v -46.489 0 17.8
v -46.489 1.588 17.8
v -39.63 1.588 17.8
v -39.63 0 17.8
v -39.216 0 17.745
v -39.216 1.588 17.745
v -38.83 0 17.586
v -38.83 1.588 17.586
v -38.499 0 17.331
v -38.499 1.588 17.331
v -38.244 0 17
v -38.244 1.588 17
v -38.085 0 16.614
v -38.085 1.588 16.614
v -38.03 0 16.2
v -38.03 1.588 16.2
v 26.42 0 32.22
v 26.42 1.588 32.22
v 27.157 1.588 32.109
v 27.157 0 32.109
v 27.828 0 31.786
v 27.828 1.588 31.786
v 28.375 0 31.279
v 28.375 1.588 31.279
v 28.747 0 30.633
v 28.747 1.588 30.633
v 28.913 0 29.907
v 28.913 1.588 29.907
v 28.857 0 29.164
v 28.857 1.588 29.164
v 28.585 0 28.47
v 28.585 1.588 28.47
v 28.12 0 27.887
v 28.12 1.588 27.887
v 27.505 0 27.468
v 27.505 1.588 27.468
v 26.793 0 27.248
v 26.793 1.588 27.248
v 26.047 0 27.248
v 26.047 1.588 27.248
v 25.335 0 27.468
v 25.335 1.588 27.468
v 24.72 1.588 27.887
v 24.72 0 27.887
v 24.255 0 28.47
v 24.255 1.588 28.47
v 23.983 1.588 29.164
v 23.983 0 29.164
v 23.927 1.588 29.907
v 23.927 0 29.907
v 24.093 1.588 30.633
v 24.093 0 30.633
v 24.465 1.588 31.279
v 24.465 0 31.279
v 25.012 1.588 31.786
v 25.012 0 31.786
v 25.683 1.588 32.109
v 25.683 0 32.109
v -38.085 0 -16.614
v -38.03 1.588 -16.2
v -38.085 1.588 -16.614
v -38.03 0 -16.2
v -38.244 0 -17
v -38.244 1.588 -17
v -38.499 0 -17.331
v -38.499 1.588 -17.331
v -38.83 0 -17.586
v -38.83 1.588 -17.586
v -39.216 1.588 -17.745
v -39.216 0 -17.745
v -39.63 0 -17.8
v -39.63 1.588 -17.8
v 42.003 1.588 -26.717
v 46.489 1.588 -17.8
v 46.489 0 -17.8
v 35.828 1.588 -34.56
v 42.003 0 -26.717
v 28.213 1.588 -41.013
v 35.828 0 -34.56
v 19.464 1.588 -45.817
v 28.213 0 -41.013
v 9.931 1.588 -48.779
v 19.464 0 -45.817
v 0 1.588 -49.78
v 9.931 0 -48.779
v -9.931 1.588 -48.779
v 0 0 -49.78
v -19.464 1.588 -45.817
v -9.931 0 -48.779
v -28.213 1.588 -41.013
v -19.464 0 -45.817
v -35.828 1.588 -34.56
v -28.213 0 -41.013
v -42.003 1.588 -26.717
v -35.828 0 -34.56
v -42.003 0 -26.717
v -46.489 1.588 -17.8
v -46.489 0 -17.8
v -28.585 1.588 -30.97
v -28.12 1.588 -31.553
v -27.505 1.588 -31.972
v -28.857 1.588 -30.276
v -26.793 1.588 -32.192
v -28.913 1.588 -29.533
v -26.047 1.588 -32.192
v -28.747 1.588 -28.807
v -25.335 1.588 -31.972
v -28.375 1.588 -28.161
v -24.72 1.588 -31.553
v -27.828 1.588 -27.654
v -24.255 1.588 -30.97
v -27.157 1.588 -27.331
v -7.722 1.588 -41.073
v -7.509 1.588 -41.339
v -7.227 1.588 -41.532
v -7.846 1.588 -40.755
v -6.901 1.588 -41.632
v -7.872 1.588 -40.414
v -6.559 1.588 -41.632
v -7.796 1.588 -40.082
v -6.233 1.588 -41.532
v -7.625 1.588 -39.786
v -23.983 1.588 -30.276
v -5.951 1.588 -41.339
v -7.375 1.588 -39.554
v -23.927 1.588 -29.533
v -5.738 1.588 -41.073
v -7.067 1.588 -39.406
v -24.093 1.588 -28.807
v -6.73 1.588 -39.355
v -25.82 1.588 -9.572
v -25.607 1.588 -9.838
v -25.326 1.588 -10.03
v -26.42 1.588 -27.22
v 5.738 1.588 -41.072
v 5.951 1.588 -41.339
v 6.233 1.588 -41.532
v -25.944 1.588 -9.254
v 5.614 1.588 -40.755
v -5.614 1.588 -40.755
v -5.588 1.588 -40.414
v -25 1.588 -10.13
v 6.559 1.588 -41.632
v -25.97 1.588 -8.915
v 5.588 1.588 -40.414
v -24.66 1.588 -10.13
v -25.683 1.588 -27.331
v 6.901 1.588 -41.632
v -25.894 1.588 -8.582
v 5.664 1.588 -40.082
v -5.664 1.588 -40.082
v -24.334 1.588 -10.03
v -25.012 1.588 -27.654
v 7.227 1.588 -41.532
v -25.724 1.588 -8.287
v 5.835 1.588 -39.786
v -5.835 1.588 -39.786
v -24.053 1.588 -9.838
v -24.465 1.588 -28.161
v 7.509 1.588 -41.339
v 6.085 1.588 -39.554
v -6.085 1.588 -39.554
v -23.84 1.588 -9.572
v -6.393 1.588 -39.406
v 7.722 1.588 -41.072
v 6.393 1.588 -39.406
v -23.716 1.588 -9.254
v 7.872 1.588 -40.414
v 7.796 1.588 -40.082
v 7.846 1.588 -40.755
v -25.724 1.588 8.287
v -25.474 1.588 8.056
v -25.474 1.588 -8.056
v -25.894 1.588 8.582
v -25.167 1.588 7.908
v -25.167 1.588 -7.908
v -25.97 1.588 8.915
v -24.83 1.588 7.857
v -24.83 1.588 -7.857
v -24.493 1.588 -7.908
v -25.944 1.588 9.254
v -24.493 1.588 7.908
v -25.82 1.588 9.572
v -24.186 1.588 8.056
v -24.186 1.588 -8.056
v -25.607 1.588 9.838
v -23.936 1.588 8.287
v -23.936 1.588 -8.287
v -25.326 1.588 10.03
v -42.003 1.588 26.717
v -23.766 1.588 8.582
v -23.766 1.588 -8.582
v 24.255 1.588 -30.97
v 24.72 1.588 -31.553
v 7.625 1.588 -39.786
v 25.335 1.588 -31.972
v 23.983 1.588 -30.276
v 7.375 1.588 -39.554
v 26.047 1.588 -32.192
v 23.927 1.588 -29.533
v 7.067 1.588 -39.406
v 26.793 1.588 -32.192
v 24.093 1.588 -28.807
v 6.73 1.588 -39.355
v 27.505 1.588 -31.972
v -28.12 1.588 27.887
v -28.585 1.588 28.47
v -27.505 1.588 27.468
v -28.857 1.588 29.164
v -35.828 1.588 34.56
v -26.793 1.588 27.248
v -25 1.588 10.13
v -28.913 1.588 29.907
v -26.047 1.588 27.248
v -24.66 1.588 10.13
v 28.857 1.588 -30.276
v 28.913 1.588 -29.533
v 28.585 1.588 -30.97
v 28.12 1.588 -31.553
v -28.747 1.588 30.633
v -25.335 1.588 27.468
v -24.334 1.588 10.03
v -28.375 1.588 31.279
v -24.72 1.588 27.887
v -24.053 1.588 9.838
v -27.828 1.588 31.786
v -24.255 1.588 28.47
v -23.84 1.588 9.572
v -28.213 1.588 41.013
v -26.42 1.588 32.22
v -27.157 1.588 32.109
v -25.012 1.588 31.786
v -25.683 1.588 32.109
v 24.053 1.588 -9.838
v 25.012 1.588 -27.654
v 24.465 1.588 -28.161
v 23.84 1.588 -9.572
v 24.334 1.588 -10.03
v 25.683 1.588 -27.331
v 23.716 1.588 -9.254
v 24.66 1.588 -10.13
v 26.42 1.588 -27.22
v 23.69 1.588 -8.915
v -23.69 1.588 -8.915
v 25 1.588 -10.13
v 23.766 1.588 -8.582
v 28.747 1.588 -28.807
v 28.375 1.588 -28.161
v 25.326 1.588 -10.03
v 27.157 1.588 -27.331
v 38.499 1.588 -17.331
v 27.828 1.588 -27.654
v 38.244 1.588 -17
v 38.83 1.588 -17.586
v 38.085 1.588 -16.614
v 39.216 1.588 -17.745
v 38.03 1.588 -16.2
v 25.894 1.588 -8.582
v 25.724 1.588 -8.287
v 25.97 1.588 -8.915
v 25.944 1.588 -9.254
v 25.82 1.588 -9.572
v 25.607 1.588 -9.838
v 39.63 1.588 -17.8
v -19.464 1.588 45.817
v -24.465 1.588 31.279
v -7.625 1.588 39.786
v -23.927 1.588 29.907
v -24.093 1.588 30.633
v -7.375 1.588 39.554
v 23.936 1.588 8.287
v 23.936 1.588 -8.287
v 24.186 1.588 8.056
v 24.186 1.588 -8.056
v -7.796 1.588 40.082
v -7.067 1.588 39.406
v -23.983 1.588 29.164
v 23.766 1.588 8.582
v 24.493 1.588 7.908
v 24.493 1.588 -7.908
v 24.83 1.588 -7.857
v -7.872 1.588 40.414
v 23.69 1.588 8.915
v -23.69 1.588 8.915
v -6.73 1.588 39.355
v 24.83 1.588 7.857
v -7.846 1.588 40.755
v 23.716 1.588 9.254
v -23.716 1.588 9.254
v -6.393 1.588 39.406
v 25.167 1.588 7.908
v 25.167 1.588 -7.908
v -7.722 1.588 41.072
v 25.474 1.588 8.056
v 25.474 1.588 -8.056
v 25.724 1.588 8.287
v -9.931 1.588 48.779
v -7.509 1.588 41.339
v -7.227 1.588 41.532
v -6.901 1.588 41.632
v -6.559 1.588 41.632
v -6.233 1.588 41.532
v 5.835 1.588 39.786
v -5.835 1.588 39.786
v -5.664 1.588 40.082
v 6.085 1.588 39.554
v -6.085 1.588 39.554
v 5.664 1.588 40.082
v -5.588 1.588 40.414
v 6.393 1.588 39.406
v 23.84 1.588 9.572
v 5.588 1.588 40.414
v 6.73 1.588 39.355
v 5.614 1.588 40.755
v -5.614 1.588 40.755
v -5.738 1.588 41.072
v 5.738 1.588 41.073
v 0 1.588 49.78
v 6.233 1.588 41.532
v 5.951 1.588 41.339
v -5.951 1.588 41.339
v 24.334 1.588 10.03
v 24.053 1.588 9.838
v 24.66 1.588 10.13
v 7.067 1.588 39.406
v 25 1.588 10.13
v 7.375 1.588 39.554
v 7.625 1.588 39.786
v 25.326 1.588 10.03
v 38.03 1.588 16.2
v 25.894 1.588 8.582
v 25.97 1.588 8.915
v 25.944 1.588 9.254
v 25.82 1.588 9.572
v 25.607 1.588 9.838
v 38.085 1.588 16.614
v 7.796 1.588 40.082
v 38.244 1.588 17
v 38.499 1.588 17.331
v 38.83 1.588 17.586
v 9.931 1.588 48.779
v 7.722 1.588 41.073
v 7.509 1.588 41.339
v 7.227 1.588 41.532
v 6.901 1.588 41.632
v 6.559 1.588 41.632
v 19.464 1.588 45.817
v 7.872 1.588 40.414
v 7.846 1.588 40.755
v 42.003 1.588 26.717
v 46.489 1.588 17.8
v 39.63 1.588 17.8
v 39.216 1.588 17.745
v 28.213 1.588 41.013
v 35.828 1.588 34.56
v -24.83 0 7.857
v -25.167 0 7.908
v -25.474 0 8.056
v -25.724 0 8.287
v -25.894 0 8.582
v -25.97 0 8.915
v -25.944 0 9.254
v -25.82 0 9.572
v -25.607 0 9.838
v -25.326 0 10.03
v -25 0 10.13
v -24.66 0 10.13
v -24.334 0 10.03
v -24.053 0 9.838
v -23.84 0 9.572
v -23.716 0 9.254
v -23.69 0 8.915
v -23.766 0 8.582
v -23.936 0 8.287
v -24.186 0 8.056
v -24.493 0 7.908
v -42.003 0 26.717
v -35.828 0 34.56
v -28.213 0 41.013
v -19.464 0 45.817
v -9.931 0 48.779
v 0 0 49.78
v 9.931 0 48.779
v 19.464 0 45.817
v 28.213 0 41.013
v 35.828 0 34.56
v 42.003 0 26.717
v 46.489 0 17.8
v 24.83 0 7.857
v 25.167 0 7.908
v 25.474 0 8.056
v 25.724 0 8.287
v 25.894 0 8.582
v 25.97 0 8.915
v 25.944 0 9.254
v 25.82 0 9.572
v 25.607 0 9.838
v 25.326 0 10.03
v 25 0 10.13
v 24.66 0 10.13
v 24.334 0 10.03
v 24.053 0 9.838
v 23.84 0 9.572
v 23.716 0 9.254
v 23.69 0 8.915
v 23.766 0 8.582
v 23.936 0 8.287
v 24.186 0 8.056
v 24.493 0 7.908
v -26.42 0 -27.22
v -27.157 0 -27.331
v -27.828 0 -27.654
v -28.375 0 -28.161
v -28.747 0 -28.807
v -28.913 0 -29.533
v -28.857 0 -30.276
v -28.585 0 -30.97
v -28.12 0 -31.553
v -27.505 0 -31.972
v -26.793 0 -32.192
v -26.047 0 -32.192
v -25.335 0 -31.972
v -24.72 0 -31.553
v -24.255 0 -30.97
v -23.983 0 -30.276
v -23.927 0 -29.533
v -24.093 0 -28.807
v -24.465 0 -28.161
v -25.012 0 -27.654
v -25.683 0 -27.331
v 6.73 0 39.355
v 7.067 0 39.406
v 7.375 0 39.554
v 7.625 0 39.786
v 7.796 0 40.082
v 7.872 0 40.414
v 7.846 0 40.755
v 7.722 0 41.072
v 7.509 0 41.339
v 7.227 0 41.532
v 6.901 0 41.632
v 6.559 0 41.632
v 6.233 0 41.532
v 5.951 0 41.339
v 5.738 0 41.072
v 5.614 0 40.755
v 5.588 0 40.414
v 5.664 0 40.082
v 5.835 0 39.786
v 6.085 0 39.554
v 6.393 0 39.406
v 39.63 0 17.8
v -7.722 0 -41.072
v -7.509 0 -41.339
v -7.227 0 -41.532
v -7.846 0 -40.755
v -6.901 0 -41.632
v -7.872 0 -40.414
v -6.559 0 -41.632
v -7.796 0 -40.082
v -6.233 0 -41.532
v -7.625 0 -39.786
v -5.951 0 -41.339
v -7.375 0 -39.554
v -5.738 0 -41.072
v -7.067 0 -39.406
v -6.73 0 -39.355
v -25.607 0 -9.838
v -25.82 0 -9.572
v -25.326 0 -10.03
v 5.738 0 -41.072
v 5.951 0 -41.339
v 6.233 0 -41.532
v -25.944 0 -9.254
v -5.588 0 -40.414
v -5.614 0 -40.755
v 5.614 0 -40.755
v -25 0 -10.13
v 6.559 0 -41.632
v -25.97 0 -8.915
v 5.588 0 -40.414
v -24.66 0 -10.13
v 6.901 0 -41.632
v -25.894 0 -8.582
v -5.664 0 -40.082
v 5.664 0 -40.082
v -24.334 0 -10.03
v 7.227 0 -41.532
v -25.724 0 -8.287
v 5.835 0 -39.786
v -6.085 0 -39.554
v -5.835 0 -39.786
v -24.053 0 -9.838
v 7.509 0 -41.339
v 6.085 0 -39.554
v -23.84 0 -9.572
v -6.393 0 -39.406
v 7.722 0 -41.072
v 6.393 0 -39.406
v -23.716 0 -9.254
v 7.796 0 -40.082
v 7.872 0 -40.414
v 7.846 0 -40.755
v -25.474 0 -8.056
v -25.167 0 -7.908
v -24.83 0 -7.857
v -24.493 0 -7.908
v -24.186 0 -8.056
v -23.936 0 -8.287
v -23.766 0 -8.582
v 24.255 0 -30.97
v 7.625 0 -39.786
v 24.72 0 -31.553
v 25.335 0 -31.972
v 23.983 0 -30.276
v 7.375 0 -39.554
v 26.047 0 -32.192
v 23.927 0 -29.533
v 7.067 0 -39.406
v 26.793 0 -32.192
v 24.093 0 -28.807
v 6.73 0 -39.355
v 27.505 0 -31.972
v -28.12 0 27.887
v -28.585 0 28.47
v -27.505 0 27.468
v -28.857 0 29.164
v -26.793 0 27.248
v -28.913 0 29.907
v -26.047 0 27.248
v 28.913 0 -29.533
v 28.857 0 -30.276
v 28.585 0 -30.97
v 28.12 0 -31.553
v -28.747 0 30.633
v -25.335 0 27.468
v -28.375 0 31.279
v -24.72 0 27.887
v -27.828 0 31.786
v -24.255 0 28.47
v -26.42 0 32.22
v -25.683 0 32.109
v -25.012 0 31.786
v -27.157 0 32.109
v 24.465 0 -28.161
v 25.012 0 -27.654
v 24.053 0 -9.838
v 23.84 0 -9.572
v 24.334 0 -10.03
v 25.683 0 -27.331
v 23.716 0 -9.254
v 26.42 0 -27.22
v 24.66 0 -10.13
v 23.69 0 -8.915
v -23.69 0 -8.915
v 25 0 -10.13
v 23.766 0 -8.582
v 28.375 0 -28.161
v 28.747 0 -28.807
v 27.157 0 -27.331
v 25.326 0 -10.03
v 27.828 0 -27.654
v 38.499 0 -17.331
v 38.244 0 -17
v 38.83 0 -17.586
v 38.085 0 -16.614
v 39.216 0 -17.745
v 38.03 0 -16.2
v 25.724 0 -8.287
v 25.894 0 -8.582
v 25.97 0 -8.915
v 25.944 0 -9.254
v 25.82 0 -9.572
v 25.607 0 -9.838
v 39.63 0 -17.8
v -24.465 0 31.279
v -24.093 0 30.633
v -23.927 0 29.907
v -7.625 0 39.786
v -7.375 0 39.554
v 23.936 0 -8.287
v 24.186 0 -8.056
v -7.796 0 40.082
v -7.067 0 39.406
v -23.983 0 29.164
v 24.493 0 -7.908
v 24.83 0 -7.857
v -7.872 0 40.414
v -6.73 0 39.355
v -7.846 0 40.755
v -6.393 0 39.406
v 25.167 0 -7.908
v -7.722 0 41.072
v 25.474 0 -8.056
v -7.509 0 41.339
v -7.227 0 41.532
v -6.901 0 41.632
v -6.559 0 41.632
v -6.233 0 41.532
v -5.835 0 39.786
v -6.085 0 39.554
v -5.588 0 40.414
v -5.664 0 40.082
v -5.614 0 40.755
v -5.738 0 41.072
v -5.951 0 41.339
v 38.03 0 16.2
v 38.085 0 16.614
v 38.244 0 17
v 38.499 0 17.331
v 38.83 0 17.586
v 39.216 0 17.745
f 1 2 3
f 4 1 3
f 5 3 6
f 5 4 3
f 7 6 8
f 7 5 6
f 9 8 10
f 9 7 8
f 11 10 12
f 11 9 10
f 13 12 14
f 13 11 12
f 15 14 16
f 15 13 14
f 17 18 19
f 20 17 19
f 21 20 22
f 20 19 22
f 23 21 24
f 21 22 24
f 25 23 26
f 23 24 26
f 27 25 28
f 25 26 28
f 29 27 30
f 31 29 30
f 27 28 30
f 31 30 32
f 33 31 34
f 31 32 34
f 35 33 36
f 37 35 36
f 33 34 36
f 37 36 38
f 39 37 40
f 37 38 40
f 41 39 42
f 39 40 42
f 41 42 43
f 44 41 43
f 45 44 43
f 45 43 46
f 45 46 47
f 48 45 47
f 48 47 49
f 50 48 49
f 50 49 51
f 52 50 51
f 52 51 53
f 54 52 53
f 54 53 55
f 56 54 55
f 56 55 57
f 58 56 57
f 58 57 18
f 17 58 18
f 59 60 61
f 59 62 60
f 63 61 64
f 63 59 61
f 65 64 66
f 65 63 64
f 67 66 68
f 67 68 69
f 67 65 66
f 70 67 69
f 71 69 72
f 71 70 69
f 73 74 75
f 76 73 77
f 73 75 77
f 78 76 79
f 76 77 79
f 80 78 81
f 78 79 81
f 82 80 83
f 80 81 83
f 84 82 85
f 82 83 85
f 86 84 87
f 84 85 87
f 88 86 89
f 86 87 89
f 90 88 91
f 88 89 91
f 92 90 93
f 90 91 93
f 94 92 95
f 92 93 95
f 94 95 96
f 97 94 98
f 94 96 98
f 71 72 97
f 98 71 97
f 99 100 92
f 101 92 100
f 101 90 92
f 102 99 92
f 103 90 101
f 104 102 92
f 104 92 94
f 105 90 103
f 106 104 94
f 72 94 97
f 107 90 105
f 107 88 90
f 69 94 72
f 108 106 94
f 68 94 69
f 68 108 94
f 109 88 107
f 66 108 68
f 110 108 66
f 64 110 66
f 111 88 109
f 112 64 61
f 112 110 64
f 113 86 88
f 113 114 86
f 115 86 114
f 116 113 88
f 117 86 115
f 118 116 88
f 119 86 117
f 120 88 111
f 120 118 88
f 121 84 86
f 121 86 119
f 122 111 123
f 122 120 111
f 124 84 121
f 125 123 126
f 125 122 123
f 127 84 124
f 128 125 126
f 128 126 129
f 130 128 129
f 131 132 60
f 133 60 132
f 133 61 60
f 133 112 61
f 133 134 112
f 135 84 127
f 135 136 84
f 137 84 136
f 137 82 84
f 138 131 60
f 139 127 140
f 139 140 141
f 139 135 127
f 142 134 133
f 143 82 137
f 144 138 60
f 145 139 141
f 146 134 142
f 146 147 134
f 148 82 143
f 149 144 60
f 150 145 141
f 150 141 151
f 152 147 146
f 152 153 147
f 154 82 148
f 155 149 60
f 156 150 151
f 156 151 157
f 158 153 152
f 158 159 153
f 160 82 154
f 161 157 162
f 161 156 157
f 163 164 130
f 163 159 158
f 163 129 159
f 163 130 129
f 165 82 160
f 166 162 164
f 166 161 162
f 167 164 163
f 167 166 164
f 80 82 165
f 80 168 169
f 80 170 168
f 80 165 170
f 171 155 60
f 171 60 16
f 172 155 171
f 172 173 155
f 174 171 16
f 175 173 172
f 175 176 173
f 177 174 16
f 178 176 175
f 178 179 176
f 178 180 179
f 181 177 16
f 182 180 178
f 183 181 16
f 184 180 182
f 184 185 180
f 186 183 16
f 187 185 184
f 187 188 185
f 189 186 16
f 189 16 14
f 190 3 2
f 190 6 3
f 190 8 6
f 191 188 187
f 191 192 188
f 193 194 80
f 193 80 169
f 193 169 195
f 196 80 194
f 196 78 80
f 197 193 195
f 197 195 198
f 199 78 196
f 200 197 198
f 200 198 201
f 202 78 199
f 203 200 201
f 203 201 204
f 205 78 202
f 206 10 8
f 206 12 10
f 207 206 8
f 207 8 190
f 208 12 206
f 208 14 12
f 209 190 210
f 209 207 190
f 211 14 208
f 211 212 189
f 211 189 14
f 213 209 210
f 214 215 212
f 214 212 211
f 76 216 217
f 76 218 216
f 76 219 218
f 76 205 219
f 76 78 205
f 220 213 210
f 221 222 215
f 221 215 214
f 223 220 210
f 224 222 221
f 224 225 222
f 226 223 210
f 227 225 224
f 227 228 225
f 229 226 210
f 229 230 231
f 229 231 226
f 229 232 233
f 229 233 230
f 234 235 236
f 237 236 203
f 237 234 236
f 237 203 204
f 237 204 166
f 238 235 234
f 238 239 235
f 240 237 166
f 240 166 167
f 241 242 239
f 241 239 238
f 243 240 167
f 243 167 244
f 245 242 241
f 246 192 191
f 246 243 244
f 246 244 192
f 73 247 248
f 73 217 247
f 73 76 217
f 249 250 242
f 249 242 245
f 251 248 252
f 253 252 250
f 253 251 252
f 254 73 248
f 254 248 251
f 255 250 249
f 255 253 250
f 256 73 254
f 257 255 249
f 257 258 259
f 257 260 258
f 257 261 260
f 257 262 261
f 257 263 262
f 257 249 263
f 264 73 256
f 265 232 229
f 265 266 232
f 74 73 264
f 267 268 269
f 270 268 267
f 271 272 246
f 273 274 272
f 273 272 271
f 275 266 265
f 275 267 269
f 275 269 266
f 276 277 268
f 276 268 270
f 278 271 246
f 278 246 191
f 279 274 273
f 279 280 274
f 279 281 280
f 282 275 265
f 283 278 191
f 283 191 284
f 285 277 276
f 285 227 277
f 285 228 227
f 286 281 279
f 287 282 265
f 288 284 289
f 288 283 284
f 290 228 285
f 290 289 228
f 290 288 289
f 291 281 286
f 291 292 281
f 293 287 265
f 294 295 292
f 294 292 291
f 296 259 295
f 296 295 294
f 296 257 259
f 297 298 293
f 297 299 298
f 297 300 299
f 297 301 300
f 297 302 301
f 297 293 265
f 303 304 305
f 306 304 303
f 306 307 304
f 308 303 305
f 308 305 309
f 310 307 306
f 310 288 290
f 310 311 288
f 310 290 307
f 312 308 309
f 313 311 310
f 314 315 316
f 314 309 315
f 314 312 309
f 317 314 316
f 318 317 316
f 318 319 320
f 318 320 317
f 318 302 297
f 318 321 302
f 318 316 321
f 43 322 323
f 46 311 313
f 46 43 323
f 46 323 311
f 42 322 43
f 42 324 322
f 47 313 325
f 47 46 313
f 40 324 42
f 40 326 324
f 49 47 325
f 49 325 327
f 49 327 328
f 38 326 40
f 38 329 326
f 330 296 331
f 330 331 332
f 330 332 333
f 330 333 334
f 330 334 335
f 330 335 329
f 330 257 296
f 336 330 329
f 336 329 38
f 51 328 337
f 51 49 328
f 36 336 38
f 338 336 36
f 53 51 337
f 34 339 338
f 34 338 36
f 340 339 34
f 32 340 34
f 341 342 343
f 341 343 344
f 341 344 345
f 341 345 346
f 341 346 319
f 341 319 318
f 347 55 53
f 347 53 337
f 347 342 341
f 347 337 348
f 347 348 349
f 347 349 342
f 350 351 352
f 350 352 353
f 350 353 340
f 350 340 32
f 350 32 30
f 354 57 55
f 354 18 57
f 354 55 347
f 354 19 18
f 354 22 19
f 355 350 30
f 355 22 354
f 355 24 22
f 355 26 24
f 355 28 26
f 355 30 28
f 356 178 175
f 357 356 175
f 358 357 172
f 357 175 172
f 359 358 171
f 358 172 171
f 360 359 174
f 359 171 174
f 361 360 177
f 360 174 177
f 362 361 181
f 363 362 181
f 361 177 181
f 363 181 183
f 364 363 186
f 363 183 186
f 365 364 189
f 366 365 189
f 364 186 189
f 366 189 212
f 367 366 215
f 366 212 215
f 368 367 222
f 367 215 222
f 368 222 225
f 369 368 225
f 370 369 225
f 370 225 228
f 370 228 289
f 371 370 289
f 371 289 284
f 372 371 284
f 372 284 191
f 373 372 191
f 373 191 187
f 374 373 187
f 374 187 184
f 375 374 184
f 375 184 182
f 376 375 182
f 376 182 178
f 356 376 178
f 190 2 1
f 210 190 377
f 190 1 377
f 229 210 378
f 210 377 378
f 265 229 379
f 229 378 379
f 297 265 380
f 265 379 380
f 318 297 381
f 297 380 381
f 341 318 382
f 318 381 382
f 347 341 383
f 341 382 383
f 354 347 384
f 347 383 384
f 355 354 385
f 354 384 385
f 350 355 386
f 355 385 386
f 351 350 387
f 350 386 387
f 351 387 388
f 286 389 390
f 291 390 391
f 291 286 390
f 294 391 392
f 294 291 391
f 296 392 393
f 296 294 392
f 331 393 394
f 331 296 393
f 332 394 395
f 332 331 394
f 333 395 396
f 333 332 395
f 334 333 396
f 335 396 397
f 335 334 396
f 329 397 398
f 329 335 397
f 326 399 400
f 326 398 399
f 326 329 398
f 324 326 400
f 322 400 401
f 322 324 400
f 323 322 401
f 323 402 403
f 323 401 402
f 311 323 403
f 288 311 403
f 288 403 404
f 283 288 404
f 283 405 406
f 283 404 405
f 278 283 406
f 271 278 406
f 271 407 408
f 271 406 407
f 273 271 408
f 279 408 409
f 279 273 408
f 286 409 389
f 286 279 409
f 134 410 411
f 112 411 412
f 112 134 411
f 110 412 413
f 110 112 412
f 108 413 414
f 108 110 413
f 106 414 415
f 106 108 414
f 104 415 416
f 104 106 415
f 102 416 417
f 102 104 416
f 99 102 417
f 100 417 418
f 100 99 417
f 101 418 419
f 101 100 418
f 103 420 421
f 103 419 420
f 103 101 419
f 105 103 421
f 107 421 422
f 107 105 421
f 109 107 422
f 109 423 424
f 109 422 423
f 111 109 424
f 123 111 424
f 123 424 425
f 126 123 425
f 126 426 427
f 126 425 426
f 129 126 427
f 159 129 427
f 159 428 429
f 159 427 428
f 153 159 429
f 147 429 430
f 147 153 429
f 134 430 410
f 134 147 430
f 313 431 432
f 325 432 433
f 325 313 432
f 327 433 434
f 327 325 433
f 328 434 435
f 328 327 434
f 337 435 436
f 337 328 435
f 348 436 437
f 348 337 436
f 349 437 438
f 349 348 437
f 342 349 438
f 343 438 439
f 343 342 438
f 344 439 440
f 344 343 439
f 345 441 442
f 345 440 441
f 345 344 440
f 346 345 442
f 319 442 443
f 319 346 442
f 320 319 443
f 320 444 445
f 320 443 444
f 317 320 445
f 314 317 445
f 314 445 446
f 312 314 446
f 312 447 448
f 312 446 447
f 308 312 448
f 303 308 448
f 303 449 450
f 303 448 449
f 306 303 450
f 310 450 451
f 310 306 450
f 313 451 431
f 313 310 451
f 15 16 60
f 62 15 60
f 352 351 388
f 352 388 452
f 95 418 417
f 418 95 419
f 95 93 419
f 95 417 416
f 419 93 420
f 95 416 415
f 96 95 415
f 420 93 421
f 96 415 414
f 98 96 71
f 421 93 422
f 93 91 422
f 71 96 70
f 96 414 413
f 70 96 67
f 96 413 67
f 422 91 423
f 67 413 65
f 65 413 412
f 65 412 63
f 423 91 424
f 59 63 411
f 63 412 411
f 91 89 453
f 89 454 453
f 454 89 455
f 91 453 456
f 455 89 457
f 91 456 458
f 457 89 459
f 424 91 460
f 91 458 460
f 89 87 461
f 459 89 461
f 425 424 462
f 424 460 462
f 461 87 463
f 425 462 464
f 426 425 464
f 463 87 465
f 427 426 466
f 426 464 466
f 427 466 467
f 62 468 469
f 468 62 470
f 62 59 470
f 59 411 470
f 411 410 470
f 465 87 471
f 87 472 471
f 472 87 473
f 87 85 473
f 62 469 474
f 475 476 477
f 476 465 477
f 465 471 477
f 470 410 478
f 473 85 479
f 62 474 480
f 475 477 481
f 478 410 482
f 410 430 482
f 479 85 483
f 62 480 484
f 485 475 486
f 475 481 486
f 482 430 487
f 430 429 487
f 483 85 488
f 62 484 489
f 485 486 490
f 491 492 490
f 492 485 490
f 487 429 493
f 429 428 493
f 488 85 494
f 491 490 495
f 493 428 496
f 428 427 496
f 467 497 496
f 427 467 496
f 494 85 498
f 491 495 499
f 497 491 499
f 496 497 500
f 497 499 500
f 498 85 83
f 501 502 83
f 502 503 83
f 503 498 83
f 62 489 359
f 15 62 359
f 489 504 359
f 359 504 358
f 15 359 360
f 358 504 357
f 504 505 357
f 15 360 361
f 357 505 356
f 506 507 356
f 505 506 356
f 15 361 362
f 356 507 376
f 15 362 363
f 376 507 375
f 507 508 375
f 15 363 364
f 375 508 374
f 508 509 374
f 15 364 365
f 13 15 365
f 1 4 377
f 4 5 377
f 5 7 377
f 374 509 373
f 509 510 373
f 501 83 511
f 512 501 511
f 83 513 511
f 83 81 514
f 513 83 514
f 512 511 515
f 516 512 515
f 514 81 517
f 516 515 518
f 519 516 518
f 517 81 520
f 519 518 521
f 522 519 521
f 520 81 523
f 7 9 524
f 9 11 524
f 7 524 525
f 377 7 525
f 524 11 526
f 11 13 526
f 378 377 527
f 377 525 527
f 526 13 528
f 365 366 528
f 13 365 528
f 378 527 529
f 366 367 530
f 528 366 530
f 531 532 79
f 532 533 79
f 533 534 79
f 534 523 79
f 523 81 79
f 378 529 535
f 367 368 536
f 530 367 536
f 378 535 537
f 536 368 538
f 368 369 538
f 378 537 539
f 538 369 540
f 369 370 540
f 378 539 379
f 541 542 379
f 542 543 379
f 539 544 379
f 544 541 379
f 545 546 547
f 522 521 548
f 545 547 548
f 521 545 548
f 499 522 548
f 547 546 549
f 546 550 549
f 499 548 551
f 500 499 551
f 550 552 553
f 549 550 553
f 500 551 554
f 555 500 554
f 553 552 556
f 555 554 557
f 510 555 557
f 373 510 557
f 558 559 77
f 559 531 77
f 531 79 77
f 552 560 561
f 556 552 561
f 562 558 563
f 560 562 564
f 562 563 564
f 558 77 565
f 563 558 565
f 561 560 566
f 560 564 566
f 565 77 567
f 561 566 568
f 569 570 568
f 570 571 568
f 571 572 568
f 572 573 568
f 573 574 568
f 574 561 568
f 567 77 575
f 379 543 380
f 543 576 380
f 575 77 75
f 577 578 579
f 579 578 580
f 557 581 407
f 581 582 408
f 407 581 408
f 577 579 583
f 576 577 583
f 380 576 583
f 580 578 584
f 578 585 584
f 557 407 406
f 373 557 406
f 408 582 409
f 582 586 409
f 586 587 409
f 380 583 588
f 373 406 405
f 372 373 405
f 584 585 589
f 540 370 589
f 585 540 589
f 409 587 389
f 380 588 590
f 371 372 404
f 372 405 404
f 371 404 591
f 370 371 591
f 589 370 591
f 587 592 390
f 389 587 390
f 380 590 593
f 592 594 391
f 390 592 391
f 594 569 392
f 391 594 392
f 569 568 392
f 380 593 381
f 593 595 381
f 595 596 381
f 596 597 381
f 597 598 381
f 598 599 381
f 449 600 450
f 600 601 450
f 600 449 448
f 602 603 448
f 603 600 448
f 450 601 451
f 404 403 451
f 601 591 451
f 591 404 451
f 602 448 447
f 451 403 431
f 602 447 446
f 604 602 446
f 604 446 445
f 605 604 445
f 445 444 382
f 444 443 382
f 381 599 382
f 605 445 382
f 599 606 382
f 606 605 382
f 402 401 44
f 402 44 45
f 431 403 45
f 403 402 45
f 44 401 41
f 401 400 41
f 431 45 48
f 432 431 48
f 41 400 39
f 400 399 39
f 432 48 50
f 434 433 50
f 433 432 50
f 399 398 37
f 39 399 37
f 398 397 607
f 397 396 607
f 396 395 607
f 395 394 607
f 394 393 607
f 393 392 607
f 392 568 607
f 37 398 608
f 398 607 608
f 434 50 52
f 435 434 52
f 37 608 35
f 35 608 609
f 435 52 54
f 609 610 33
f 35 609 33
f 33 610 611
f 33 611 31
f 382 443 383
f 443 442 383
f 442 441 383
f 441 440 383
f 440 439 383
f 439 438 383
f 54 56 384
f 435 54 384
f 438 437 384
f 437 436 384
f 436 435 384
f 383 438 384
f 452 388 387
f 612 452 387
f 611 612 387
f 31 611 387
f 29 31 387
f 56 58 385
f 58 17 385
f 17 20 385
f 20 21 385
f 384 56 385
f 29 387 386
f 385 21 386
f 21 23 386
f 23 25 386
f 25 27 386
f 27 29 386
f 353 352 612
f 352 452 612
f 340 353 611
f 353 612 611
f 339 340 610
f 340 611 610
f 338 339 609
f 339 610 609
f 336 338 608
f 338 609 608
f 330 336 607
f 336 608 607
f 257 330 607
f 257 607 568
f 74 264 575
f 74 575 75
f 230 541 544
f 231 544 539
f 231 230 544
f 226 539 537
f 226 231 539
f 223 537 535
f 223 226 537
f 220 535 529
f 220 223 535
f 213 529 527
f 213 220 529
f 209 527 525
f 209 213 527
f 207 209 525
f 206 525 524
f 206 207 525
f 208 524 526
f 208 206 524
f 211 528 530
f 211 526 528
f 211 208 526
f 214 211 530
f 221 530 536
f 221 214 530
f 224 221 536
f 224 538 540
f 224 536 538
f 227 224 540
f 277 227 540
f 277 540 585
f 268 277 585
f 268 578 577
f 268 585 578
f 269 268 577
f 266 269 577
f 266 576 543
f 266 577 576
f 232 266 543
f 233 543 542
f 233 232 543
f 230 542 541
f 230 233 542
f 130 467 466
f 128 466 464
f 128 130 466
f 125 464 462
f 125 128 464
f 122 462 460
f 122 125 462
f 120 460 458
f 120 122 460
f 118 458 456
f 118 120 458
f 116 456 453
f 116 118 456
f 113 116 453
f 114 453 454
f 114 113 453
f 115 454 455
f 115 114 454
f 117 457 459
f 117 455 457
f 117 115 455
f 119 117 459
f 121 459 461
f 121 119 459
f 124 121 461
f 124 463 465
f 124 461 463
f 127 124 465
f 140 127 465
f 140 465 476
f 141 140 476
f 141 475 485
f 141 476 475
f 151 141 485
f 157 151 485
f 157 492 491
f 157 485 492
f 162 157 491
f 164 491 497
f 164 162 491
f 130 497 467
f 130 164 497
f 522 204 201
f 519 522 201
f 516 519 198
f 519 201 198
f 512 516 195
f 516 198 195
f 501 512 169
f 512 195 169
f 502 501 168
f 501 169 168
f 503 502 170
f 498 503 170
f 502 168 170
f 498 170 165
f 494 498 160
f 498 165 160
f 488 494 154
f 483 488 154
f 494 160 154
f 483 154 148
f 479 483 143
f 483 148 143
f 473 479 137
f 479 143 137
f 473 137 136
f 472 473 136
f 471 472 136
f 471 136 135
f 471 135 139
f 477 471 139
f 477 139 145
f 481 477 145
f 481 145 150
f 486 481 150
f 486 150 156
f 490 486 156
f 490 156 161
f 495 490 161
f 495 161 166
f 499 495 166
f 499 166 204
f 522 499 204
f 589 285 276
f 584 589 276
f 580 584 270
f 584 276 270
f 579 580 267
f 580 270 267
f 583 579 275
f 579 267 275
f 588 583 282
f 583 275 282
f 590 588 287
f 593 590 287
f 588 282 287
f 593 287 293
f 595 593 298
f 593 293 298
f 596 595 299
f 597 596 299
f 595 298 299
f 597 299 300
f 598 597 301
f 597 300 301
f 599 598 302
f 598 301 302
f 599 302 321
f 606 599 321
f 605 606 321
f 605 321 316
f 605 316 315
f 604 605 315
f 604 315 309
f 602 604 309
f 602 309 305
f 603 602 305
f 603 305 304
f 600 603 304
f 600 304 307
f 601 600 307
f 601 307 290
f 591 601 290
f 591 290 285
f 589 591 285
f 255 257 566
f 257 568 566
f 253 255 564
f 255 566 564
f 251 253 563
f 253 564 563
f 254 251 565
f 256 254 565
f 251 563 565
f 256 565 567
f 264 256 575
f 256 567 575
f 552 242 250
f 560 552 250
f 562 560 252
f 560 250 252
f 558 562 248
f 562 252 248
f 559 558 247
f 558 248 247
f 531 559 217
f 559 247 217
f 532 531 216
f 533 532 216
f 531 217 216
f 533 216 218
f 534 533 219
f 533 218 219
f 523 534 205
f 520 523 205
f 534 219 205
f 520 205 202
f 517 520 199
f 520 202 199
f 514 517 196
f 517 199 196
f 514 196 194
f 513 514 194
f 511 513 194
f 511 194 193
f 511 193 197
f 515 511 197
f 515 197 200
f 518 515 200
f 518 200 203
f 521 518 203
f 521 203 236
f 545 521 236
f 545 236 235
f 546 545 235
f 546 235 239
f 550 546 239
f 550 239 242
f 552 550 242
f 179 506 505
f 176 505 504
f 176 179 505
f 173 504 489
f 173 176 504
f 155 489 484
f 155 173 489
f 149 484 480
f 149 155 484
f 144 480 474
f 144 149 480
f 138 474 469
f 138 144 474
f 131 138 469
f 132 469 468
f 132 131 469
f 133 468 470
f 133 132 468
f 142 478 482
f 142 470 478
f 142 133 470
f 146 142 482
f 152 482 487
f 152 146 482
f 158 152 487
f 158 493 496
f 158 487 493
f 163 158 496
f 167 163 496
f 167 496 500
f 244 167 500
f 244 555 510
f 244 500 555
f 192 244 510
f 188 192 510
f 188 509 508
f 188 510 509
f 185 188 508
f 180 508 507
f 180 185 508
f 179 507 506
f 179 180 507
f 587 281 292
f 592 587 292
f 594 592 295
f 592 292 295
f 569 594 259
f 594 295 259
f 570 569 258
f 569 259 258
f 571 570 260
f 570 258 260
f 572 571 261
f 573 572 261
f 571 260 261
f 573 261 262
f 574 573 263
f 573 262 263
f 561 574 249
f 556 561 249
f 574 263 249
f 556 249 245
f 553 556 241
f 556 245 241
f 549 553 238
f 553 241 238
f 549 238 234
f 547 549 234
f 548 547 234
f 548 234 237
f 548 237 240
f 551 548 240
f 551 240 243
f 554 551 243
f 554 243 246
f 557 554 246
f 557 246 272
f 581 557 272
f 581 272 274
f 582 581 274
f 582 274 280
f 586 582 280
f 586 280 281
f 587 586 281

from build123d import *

# Parameters (mm, degrees)
SKETCH1_R               = 49.78
EXTRUDE1_DEPTH          = 1.5875
SKETCH2_R               = 2.5
EXTRUDE2_DEPTH          = 10
CUT_EXTRUDE1_DEPTH      = 71.417447811
FILLET5_R               = 1.6
FILLET5_OF_MIRROR4_R    = 1.6
SKETCH4_R               = 1.145
CUT_EXTRUDE2_DEPTH      = 69.130587523
MIRROR7_COPY_1_SKETCH_R = 1.145
MIRROR7_COPY_1_DEPTH    = 69.130587523
MIRROR7_COPY_2_SKETCH_R = 1.145
MIRROR7_COPY_2_DEPTH    = 69.130587523
SKETCH6_R               = 1.143
CUT_EXTRUDE4_DEPTH      = 69.130587523
MIRROR9_COPY_1_SKETCH_R = 1.143
MIRROR9_COPY_1_DEPTH    = 69.130587523
MIRROR9_COPY_2_SKETCH_R = 1.143
MIRROR9_COPY_2_DEPTH    = 69.130587523


with BuildPart() as part:
    # Sketch1 → Extrude1 (new body)
    with BuildSketch(Plane(origin=(0, 0, 0), x_dir=(1, 0, 0), z_dir=(0, 1, 0))):
        Circle(SKETCH1_R)
    extrude(amount=EXTRUDE1_DEPTH)

    # Sketch2 → Extrude2 (cut)
    with BuildSketch(Plane(origin=(0, 1.5875, 0), x_dir=(-1, 0, 0), z_dir=(0, 1, 0))):
        with Locations((-26.42, -29.72)):
            Circle(SKETCH2_R)
        with Locations((-26.42, 29.72)):
            Circle(SKETCH2_R)
    extrude2 = extrude(amount=-EXTRUDE2_DEPTH, mode=Mode.SUBTRACT)

    # Sketch3 → Cut-Extrude1 (cut, through all)
    with BuildSketch(Plane(origin=(0, 1.5875, 0), x_dir=(1, 0, 0), z_dir=(0, 1, 0))):
        with BuildLine():
            Line((38.03, 0), (38.03, 17.8))
            Line((38.03, 17.8), (46.488798651, 17.8))
            ThreePointArc((46.488798651, 17.8), (49.78, 0), (46.488798651, -17.8))
            Line((46.488798651, -17.8), (38.03, -17.8))
            Line((38.03, -17.8), (38.03, 0))
        make_face()
    cut_extrude1 = extrude(amount=-CUT_EXTRUDE1_DEPTH, mode=Mode.SUBTRACT)

    # Fillet5
    fillet5_edges = [part.edges().sort_by_distance(p)[0] for p in [
        (38.03, 0.79375, 17.8),
        (38.03, 0.79375, -17.8),
    ]]
    fillet(fillet5_edges, radius=FILLET5_R)

    # Mirror4: Cut-Extrude1 across plane
    add(cut_extrude1.mirror(Plane(origin=(0, 0, 0), x_dir=(0, 0, 1), z_dir=(1, 0, 0))), mode=Mode.SUBTRACT)

    # Fillet5 of Mirror4
    fillet5_of_mirror4_edges = [part.edges().sort_by_distance(p)[0] for p in [
        (-38.03, 0.79375, 17.8),
        (-38.03, 0.79375, -17.8),
    ]]
    fillet(fillet5_of_mirror4_edges, radius=FILLET5_OF_MIRROR4_R)

    # Sketch4 → Cut-Extrude2 (cut, through all)
    with BuildSketch(Plane(origin=(0, 1.5875, 0), x_dir=(1, 0, 0), z_dir=(0, 1, 0))):
        with Locations((6.73, 40.5)):
            Circle(SKETCH4_R)
    cut_extrude2 = extrude(amount=-CUT_EXTRUDE2_DEPTH, mode=Mode.SUBTRACT)

    # Mirror5: Cut-Extrude2 across plane
    add(cut_extrude2.mirror(Plane(origin=(0, 0, 0), x_dir=(0, 0, 1), z_dir=(1, 0, 0))), mode=Mode.SUBTRACT)

    # Mirror7 copy 1 sketch → Mirror7 copy 1 (cut, through all)
    with BuildSketch(Plane(origin=(0, 1.5875, 0), x_dir=(-1, 0, 0), z_dir=(0, 1, 0))):
        with Locations((6.73, 40.5)):
            Circle(MIRROR7_COPY_1_SKETCH_R)
    extrude(amount=-MIRROR7_COPY_1_DEPTH, mode=Mode.SUBTRACT)

    # Mirror7 copy 2 sketch → Mirror7 copy 2 (cut, through all)
    with BuildSketch(Plane(origin=(0, 1.5875, 0), x_dir=(1, 0, 0), z_dir=(0, 1, 0))):
        with Locations((6.73, -40.5)):
            Circle(MIRROR7_COPY_2_SKETCH_R)
    extrude(amount=-MIRROR7_COPY_2_DEPTH, mode=Mode.SUBTRACT)

    # Mirror1: Extrude2 across plane
    add(extrude2.mirror(Plane(origin=(0, 0, 0), x_dir=(0, 0, 1), z_dir=(1, 0, 0))), mode=Mode.SUBTRACT)

    # Sketch6 → Cut-Extrude4 (cut, through all)
    with BuildSketch(Plane(origin=(0, 1.5875, 0), x_dir=(1, 0, 0), z_dir=(0, 1, 0))):
        with Locations((24.83, 9)):
            Circle(SKETCH6_R)
    cut_extrude4 = extrude(amount=-CUT_EXTRUDE4_DEPTH, mode=Mode.SUBTRACT)

    # Mirror8: Cut-Extrude4 across plane
    add(cut_extrude4.mirror(Plane.XY), mode=Mode.SUBTRACT)

    # Mirror9 copy 1 sketch → Mirror9 copy 1 (cut, through all)
    with BuildSketch(Plane(origin=(0, 1.5875, 0), x_dir=(-1, 0, 0), z_dir=(0, 1, 0))):
        with Locations((24.83, 9)):
            Circle(MIRROR9_COPY_1_SKETCH_R)
    extrude(amount=-MIRROR9_COPY_1_DEPTH, mode=Mode.SUBTRACT)

    # Mirror9 copy 2 sketch → Mirror9 copy 2 (cut, through all)
    with BuildSketch(Plane(origin=(0, 1.5875, 0), x_dir=(-1, 0, 0), z_dir=(0, 1, 0))):
        with Locations((24.83, -9)):
            Circle(MIRROR9_COPY_2_SKETCH_R)
    extrude(amount=-MIRROR9_COPY_2_DEPTH, mode=Mode.SUBTRACT)


solid = part.part
